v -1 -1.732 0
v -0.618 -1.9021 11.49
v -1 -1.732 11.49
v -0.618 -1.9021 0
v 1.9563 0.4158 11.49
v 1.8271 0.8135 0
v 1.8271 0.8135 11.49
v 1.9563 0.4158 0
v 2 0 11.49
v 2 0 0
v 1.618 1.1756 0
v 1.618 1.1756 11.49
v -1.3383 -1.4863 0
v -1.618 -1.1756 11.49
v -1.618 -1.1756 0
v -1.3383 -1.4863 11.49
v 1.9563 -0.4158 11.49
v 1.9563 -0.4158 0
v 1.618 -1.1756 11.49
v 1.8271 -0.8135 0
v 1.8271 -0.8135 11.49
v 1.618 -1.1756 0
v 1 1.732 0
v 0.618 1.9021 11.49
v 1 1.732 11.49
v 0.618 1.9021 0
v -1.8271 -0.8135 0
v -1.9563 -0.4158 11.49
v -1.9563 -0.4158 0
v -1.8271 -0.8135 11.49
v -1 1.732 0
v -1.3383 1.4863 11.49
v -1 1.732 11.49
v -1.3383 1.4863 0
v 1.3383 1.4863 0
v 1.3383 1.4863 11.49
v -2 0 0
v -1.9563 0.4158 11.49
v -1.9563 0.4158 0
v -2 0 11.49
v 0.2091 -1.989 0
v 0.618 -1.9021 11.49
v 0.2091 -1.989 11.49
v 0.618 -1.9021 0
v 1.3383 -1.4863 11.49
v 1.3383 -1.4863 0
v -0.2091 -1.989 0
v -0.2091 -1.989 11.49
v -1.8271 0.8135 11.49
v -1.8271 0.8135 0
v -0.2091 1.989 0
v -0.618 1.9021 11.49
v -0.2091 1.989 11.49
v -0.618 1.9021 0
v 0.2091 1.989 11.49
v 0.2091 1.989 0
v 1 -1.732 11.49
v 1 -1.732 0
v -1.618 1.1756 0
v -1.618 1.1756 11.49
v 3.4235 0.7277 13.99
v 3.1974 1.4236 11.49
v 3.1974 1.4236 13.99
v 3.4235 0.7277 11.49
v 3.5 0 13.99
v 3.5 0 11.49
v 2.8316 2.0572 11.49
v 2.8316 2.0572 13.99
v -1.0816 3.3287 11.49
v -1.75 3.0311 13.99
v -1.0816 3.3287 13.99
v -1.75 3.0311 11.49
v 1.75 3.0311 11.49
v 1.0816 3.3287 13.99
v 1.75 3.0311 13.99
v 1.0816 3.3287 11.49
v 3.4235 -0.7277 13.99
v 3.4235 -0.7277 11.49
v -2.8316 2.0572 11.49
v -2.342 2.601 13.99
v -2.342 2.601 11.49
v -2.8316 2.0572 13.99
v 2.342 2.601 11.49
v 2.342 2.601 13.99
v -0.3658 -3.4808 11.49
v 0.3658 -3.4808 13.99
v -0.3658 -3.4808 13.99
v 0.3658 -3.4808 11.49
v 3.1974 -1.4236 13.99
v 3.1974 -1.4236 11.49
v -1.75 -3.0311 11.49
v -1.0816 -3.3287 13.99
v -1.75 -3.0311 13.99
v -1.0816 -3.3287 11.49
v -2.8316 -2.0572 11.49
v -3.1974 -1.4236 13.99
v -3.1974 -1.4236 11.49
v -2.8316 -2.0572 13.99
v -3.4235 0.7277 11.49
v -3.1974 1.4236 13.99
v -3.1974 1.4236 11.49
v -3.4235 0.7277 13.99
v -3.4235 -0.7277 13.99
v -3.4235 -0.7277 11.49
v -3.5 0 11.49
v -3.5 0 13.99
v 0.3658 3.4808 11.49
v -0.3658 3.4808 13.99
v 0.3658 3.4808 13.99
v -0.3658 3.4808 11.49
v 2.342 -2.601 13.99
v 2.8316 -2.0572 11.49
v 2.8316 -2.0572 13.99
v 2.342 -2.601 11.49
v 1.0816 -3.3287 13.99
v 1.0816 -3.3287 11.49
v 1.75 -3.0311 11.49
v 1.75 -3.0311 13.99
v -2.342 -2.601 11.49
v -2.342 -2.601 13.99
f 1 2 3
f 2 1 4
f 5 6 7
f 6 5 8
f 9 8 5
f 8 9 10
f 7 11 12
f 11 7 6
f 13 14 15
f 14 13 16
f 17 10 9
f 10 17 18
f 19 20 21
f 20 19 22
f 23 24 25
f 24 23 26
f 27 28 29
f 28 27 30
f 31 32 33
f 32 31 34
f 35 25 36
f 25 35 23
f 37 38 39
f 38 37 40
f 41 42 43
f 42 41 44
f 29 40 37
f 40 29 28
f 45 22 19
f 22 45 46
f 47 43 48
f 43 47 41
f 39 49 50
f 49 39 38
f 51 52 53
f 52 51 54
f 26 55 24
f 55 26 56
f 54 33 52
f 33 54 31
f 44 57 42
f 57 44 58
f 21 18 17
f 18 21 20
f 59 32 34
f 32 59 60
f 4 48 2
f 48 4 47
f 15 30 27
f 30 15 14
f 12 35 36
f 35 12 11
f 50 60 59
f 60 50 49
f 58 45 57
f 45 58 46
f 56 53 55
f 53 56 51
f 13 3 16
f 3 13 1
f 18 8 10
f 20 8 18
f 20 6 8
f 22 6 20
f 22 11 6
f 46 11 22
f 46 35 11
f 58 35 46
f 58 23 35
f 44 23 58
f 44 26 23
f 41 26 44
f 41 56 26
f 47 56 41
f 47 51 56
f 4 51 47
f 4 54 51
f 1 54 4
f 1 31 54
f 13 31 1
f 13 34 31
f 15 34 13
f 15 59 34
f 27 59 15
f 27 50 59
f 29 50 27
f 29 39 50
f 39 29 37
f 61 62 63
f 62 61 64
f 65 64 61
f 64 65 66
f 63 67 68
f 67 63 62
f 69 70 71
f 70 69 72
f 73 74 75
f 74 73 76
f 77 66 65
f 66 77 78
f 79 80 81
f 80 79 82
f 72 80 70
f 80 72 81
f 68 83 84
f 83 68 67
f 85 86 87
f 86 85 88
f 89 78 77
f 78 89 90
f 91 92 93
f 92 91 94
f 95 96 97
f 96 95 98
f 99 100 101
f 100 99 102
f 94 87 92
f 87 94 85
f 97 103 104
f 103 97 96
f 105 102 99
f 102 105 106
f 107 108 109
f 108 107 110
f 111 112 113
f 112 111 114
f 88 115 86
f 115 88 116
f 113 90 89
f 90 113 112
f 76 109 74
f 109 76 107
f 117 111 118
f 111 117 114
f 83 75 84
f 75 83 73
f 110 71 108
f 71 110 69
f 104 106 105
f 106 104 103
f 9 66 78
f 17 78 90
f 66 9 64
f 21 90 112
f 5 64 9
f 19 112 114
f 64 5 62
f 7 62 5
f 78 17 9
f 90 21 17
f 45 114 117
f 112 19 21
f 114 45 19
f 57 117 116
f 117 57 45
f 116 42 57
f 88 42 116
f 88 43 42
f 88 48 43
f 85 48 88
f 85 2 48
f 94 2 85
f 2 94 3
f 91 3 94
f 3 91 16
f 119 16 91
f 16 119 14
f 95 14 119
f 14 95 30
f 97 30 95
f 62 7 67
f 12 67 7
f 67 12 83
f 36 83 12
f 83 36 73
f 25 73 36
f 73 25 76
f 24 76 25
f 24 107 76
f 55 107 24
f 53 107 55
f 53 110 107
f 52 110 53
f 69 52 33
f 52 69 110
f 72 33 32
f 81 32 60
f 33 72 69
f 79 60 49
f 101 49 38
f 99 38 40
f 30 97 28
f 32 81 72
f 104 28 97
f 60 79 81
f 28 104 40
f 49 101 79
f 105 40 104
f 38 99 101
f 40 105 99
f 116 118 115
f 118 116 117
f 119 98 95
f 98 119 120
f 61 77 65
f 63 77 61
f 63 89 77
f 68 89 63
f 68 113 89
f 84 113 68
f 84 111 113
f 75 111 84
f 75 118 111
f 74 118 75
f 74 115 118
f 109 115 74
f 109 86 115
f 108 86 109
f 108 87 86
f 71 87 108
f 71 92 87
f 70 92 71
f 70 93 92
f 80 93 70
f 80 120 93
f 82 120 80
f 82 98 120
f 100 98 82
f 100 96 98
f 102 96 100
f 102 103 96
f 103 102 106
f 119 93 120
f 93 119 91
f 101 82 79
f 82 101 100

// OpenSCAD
/*
Copyright (C) Saeed Gholami Shahbandi. All rights reserved.
Author: Saeed Gholami Shahbandi (saeed.gh.sh@gmail.com)

This file is part of Arrangement Library.
The of Arrangement Library is free software: you can redistribute it and/or
modify it under the terms of the GNU Lesser General Public License as published
by the Free Software Foundation, either version 3 of the License,
or (at your option) any later version.

This program is distributed in the hope that it will be useful, but WITHOUT ANY
WARRANTY; without even the implied warranty of MERCHANTABILITY or FITNESS FOR A
PARTICULAR PURPOSE. See the GNU Lesser General Public License for more details.

You should have received a copy of the GNU Lesser General Public License along
with this program. If not, see <http://www.gnu.org/licenses/>
*/
tol = 0.01;

// Returns form factor of a very simple screw
module formFactorScrew(radius, height, head_radius, head_height)
{    
    union(){
        // threaded part
        color("Green", 1.0)
        cylinder($fn=30, h=height, r=radius, center=false);
        
        // head part
        color("Green", 1.0)
        translate([0, 0, height-tol])
        cylinder($fn=30, h=head_height, r=head_radius, center=false);
    }    
}


// example of creating a M4 screw
formFactorScrew(radius=4/2, height=11.5, head_radius=7/2, head_height=2.5);
